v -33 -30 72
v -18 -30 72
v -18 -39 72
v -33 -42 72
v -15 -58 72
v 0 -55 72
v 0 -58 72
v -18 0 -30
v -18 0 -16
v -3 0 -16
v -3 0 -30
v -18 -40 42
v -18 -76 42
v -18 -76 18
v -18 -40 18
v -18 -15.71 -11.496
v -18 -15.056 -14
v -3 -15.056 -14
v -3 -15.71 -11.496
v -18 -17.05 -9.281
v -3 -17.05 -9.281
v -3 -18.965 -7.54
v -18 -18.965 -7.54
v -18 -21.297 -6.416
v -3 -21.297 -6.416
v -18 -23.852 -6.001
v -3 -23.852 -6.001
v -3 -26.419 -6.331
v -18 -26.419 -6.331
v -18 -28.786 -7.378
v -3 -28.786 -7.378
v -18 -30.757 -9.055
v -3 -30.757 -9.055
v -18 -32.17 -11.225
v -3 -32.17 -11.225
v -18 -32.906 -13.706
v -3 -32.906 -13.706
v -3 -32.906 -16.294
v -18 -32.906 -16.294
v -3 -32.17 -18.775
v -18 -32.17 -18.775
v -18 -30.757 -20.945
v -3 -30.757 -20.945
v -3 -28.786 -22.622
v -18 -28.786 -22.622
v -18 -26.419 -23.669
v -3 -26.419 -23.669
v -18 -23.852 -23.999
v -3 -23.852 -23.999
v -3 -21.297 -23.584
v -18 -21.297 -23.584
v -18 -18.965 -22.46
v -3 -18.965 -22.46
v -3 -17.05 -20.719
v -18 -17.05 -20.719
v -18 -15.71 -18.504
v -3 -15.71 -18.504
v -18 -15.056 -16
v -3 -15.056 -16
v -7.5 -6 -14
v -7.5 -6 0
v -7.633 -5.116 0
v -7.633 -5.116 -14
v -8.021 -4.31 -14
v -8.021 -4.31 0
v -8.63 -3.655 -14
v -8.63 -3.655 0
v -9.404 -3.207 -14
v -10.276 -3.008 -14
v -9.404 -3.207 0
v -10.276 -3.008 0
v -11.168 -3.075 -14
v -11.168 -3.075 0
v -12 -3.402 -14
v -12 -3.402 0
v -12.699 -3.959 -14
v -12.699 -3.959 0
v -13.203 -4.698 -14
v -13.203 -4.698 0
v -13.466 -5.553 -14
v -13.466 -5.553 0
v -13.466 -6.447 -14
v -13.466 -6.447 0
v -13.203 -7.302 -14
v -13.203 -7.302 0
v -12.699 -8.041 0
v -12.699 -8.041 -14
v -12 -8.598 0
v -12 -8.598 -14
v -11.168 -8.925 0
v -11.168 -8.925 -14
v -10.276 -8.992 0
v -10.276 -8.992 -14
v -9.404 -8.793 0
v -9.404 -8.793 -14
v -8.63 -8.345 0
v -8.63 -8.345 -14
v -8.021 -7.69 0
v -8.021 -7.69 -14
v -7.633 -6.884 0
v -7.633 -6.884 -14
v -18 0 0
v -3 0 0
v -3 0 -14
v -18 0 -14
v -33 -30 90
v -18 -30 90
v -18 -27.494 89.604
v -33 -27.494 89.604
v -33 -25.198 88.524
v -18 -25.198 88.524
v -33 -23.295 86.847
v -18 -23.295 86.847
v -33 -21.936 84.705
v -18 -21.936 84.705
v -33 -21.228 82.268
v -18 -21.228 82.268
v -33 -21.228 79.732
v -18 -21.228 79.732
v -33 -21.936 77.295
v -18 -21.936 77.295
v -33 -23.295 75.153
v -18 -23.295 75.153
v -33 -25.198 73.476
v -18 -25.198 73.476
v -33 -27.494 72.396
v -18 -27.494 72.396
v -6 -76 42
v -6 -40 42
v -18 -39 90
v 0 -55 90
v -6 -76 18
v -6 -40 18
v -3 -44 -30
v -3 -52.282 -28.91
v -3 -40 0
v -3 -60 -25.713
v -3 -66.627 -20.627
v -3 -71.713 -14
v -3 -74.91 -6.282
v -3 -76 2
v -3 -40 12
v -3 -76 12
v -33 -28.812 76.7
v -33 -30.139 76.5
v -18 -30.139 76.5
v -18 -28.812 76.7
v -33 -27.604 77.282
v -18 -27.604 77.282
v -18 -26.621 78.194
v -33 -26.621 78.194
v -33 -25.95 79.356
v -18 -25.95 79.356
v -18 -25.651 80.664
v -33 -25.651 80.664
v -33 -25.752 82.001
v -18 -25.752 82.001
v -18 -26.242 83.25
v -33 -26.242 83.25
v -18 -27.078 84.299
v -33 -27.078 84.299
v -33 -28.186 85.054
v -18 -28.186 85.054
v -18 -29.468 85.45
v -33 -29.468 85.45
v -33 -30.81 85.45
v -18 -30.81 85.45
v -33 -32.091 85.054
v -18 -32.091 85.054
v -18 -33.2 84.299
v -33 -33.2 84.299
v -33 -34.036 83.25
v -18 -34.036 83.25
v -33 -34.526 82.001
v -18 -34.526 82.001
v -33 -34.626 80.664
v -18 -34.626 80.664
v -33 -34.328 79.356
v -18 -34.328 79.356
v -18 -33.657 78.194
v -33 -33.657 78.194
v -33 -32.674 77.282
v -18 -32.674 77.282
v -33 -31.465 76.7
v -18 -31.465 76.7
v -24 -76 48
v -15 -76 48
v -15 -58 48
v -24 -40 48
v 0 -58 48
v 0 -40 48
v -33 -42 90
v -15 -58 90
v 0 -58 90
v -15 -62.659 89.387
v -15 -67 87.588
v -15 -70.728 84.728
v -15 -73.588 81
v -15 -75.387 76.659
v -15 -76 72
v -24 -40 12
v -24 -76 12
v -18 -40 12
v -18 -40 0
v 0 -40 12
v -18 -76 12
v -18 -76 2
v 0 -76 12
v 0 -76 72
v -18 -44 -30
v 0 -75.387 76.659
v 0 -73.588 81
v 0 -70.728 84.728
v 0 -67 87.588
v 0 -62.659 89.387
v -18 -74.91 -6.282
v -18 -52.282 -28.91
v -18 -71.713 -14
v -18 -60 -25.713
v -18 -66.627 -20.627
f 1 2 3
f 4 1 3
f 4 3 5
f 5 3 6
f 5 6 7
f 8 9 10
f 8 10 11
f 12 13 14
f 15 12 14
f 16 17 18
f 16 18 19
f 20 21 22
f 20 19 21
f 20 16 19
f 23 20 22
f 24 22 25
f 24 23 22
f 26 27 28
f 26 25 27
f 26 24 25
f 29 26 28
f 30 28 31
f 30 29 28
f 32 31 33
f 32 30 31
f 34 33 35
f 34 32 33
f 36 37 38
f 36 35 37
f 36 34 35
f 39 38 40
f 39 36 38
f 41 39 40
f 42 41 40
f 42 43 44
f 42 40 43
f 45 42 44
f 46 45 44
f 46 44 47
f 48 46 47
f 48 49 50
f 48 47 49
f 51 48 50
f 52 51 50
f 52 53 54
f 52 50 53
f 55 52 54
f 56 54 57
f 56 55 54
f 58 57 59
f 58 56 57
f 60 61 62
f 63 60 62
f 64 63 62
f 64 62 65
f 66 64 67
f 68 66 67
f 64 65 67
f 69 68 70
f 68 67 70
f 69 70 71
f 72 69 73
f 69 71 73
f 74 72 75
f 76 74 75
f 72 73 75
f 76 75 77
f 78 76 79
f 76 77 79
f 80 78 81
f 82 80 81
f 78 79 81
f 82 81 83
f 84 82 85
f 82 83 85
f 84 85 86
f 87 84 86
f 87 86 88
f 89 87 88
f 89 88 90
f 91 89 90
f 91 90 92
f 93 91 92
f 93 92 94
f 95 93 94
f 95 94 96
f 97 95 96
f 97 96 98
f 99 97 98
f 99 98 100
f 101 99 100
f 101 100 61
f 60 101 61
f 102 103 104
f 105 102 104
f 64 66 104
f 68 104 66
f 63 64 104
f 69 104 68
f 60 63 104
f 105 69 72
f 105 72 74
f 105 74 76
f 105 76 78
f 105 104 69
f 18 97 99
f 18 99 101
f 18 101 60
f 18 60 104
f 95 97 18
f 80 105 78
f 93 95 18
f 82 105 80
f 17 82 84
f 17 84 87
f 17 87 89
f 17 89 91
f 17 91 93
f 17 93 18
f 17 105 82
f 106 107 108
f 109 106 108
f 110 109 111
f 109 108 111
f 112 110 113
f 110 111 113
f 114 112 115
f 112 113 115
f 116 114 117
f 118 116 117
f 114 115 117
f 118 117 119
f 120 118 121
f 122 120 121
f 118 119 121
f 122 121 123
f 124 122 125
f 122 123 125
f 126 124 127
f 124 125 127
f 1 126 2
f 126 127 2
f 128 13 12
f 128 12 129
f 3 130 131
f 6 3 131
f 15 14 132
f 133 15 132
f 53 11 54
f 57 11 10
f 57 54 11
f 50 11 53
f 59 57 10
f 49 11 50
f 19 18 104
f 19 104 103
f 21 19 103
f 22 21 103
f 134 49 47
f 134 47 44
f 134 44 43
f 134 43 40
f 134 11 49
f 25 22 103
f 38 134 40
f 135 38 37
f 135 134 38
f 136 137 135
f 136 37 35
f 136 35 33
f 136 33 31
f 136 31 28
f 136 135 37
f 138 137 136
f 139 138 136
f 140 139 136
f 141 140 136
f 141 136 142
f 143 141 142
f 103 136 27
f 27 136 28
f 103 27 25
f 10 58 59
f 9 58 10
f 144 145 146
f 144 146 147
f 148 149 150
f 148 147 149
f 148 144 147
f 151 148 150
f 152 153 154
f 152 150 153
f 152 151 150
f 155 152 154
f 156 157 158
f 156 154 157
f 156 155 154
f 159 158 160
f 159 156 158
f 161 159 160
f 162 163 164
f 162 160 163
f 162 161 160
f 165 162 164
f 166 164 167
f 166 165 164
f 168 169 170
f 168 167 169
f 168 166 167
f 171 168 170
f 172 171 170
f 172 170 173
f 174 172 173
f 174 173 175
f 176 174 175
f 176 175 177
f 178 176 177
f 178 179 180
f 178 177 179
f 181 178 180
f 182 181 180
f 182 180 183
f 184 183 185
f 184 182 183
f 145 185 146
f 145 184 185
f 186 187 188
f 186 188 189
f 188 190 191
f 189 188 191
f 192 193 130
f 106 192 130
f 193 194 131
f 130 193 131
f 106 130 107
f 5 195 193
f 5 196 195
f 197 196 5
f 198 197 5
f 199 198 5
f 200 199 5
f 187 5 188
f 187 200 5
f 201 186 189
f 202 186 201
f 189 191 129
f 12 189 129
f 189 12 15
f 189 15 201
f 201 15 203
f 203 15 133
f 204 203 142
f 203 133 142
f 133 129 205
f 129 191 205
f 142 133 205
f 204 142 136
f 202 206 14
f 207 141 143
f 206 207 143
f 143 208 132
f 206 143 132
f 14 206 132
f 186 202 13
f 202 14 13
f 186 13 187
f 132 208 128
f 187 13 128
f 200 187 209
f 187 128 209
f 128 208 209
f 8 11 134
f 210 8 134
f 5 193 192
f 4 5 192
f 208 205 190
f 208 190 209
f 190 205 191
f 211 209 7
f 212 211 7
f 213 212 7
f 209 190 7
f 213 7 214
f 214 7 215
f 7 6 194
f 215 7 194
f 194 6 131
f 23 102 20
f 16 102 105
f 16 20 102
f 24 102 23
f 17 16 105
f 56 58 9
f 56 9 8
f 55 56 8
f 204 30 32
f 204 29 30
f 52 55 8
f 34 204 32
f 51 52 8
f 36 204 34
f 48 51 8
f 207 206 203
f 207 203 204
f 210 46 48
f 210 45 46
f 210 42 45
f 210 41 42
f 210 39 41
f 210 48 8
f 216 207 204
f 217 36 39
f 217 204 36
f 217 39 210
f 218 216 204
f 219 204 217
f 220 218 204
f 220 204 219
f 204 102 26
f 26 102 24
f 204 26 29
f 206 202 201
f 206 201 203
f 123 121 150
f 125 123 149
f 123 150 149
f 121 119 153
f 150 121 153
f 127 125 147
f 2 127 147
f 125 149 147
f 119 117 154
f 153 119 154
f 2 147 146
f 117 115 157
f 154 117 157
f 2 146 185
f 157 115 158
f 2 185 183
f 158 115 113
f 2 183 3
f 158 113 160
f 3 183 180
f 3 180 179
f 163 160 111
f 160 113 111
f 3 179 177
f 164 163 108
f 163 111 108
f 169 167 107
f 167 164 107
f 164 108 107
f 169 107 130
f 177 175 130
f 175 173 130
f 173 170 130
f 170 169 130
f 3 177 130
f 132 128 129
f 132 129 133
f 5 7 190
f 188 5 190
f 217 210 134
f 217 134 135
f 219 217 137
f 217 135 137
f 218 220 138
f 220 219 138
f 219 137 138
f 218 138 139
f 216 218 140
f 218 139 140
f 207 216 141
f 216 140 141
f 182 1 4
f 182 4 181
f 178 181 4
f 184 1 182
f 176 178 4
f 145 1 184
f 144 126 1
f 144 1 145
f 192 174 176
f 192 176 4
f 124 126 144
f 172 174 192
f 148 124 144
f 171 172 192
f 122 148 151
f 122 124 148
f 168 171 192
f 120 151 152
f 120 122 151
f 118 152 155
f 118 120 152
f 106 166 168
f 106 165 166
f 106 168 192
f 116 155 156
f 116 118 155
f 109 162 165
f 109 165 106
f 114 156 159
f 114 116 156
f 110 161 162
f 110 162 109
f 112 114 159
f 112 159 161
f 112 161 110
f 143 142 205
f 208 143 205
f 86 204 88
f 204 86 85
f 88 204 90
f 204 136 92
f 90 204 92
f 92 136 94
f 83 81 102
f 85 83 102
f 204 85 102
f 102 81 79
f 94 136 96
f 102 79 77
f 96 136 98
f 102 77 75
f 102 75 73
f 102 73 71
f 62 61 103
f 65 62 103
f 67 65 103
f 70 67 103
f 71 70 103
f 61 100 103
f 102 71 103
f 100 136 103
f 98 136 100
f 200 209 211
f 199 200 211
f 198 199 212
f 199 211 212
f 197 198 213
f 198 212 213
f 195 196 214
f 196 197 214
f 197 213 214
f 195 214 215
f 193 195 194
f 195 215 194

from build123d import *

# Parameters (mm, degrees)
BOSS_EXTRUDE2_DEPTH     = 33
CUT_EXTRUDE1_DEPTH      = 123.331516789
CUT_EXTRUDE1_DEPTH_BACK = 123.331516789
CUT_EXTRUDE2_DEPTH      = 123.331516789
CUT_EXTRUDE2_DEPTH_BACK = 123.331516789
SKETCH1_5_R             = 4.5
CUT_EXTRUDE3_DEPTH      = 123.331516789
CUT_EXTRUDE3_DEPTH_BACK = 123.331516789
SKETCH3_W               = 9
SKETCH3_H               = 48
CUT_EXTRUDE4_DEPTH      = 113.040171367
CUT_EXTRUDE4_DEPTH_BACK = 113.040171367
SKETCH4_W               = 18
SKETCH4_H               = 24
CUT_EXTRUDE5_DEPTH      = 104.870111197
CUT_EXTRUDE5_DEPTH_BACK = 104.870111197
SKETCH5_W               = 9
SKETCH5_H               = 30
CUT_EXTRUDE6_DEPTH      = 104.870111197
CUT_EXTRUDE6_DEPTH_BACK = 104.870111197
SKETCH6_W               = 6
SKETCH6_H               = 42
CUT_EXTRUDE7_DEPTH      = 104.870111197
CUT_EXTRUDE7_DEPTH_BACK = 104.870111197
SKETCH7_W               = 13.713453575
SKETCH7_H               = 47.251215896
CUT_EXTRUDE8_DEPTH      = 104.870111197
CUT_EXTRUDE8_DEPTH_BACK = 104.870111197
SKETCH8_W               = 12
SKETCH8_H               = 24
CUT_EXTRUDE10_REACH     = 124.332
SKETCH9_R               = 3
CUT_EXTRUDE11_DEPTH     = 27
CUT_EXTRUDE12_DEPTH     = 27


with BuildPart() as part:
    # Sketch1 → Boss-Extrude2 (new body)
    with BuildSketch(Plane(origin=(0, 0, 0), x_dir=(0, 0, -1), z_dir=(1, 0, 0))):
        with BuildLine():
            Line((0, 0), (30, 0))
            Line((30, 0), (30, -44))
            ThreePointArc((30, -44), (20.627416998, -66.627416998), (-2, -76))
            Line((-2, -76), (-12, -76))
            Line((-12, -76), (-48, -76))
            Line((-48, -76), (-72, -76))
            ThreePointArc((-72, -76), (-84.727922061, -70.727922061), (-90, -58))
            Line((-90, -58), (-90, -30))
            ThreePointArc((-90, -30), (-81, -21.137772707), (-72, -30))
            Line((-72, -30), (-72, -58))
            Line((-72, -58), (-48, -58))
            Line((-48, -58), (-48, -40))
            Line((-48, -40), (0, -40))
            Line((0, -40), (0, 0))
        make_face()
    extrude(amount=-BOSS_EXTRUDE2_DEPTH)

    # Sketch1<4> → Cut-Extrude1 (cut, two sides: drawn at the far end of the back side and taken through both)
    with BuildSketch(Plane(origin=(0, 0, 0), x_dir=(0, 0, -1), z_dir=(1, 0, 0)).offset(-CUT_EXTRUDE1_DEPTH_BACK)):
        with BuildLine():
            Line((16, 0), (14, 0))
            Line((14, 0), (14, -15.05572809))
            ThreePointArc((14, -15.05572809), (15, -33), (16, -15.05572809))
            Line((16, -15.05572809), (16, 0))
        make_face()
    extrude(amount=CUT_EXTRUDE1_DEPTH + CUT_EXTRUDE1_DEPTH_BACK, mode=Mode.SUBTRACT)

    # Sketch1<5> → Cut-Extrude2 (cut, two sides: drawn at the far end of the back side and taken through both)
    with BuildSketch(Plane(origin=(0, 0, 0), x_dir=(0, 0, -1), z_dir=(1, 0, 0)).offset(-CUT_EXTRUDE2_DEPTH_BACK)):
        with Locations((-81, -30.138843618)):
            Circle(SKETCH1_5_R)
    extrude(amount=CUT_EXTRUDE2_DEPTH + CUT_EXTRUDE2_DEPTH_BACK, mode=Mode.SUBTRACT)

    # Sketch3 → Cut-Extrude3 (cut, two sides: drawn at the far end of the back side and taken through both)
    with BuildSketch(Plane(origin=(0, 0, 0), x_dir=(1, 0, 0), z_dir=(0, 1, 0)).offset(-CUT_EXTRUDE3_DEPTH_BACK)):
        with Locations((-28.5, -24)):
            Rectangle(SKETCH3_W, SKETCH3_H)
    extrude(amount=CUT_EXTRUDE3_DEPTH + CUT_EXTRUDE3_DEPTH_BACK, mode=Mode.SUBTRACT)

    # Sketch4 → Cut-Extrude4 (cut, two sides: drawn at the far end of the back side and taken through both)
    with BuildSketch(Plane(origin=(0, -58, 0), x_dir=(1, 0, 0), z_dir=(0, 1, 0)).offset(-CUT_EXTRUDE4_DEPTH_BACK)):
        with Locations((-24, -60)):
            Rectangle(SKETCH4_W, SKETCH4_H)
    extrude(amount=CUT_EXTRUDE4_DEPTH + CUT_EXTRUDE4_DEPTH_BACK, mode=Mode.SUBTRACT)

    # Sketch5 → Cut-Extrude5 (cut, two sides: drawn at the far end of the back side and taken through both)
    with BuildSketch(Plane(origin=(0, -40, 0), x_dir=(1, 0, 0), z_dir=(0, 1, 0)).offset(-CUT_EXTRUDE5_DEPTH_BACK)):
        with Locations((-28.5, 15)):
            Rectangle(SKETCH5_W, SKETCH5_H)
    extrude(amount=CUT_EXTRUDE5_DEPTH + CUT_EXTRUDE5_DEPTH_BACK, mode=Mode.SUBTRACT)

    # Sketch6 → Cut-Extrude6 (cut, two sides: drawn at the far end of the back side and taken through both)
    with BuildSketch(Plane(origin=(0, -40, 0), x_dir=(1, 0, 0), z_dir=(0, 1, 0)).offset(-CUT_EXTRUDE6_DEPTH_BACK)):
        with Locations((-21, 9)):
            Rectangle(SKETCH6_W, SKETCH6_H)
    extrude(amount=CUT_EXTRUDE6_DEPTH + CUT_EXTRUDE6_DEPTH_BACK, mode=Mode.SUBTRACT)

    # Sketch7 → Cut-Extrude7 (cut, two sides: drawn at the far end of the back side and taken through both)
    with BuildSketch(Plane(origin=(0, -40, 0), x_dir=(1, 0, 0), z_dir=(0, 1, 0)).offset(-CUT_EXTRUDE7_DEPTH_BACK)):
        with Locations((3.856726788, 11.625607948)):
            Rectangle(SKETCH7_W, SKETCH7_H)
    extrude(amount=CUT_EXTRUDE7_DEPTH + CUT_EXTRUDE7_DEPTH_BACK, mode=Mode.SUBTRACT)

    # Sketch8 → Cut-Extrude8 (cut, two sides: drawn at the far end of the back side and taken through both)
    with BuildSketch(Plane(origin=(0, -40, 0), x_dir=(1, 0, 0), z_dir=(0, 1, 0)).offset(-CUT_EXTRUDE8_DEPTH_BACK)):
        with Locations((-12, -30)):
            Rectangle(SKETCH8_W, SKETCH8_H)
    extrude(amount=CUT_EXTRUDE8_DEPTH + CUT_EXTRUDE8_DEPTH_BACK, mode=Mode.SUBTRACT)

    # Sketch9 → Cut-Extrude10 (cut, up to next)
    with BuildSketch(Plane.XY, mode=Mode.PRIVATE) as cut_extrude10_sk1:
        with Locations((-10.5, -6)):
            Circle(SKETCH9_R)
    cut_extrude10_tool1 = extrude(cut_extrude10_sk1.sketch, amount=-CUT_EXTRUDE10_REACH, mode=Mode.PRIVATE) & part.part
    add(cut_extrude10_tool1.solids().sort_by_distance((-10.5, -6, 0))[0], mode=Mode.SUBTRACT)

    # Sketch10 → Cut-Extrude11 (cut)
    with BuildSketch(Plane.XY.offset(90)):
        Polygon((-15, -58), (-33, -42), (-33, -76), (-15, -76), align=None)
    extrude(amount=-CUT_EXTRUDE11_DEPTH, mode=Mode.SUBTRACT)

    # Sketch11 → Cut-Extrude12 (cut)
    with BuildSketch(Plane.XY.offset(90)):
        Polygon((0, -55), (0, -21.137772707), (-18, -21.137772707), (-18, -39), align=None)
    extrude(amount=-CUT_EXTRUDE12_DEPTH, mode=Mode.SUBTRACT)


solid = part.part
